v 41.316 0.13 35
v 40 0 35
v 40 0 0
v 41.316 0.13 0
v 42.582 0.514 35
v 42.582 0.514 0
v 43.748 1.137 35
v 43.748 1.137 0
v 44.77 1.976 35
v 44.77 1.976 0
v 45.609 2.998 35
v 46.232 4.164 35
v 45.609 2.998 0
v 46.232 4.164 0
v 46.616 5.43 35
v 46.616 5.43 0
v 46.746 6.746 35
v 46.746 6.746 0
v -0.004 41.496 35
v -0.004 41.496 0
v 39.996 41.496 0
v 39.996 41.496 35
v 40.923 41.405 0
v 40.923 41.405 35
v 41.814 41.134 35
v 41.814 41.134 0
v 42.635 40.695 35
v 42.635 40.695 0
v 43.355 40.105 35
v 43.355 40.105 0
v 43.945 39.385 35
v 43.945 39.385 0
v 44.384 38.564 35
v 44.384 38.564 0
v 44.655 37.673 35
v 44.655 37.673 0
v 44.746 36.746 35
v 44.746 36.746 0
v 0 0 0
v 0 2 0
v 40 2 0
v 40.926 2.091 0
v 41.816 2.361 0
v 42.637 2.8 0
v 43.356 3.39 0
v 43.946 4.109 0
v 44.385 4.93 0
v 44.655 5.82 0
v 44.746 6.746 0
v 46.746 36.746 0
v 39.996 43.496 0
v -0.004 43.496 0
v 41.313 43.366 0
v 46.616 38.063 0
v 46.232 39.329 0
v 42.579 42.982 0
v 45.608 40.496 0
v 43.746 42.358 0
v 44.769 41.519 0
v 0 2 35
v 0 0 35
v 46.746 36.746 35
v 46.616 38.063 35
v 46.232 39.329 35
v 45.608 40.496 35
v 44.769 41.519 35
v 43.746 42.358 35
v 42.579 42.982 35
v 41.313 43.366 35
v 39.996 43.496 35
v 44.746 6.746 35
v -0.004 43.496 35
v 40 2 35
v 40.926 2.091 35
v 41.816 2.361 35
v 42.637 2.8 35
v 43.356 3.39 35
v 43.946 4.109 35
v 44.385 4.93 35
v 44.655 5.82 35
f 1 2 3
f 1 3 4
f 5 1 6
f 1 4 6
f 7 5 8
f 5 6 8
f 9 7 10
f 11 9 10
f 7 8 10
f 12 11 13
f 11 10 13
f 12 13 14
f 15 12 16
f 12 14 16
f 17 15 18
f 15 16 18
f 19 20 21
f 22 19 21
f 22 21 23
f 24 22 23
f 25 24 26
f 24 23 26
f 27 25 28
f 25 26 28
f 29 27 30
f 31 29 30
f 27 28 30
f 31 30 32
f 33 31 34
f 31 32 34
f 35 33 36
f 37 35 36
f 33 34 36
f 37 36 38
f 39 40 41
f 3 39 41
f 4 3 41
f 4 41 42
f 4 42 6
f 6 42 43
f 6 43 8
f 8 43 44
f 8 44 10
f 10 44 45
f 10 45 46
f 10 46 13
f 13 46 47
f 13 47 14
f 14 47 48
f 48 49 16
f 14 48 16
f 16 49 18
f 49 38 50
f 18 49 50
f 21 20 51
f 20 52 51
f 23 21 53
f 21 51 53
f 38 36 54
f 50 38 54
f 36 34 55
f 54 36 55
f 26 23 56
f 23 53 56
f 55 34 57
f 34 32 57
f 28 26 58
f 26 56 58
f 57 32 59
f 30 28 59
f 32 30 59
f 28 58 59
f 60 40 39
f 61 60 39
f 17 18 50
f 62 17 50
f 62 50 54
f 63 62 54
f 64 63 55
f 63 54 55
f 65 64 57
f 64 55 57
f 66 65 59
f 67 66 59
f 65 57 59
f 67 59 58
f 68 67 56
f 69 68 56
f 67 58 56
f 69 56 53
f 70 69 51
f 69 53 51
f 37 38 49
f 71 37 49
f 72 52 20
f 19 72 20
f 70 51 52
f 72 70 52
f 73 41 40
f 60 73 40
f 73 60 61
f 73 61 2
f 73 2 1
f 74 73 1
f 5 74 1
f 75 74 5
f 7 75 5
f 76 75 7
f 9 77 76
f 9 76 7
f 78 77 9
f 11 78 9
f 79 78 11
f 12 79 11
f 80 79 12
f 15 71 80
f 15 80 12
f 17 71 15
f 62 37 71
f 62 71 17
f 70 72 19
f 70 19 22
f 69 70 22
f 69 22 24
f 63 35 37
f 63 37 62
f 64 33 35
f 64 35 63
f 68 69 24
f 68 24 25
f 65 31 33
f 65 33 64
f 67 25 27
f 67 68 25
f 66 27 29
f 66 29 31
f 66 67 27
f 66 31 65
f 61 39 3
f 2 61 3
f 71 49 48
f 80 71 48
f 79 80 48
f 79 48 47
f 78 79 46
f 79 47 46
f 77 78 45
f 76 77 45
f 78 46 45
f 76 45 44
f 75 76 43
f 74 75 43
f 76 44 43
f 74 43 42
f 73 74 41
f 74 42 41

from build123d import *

# Parameters (mm, degrees)
BOSS_EXTRUDE1_DEPTH  = 35
CONVERT_SOLID1_DEPTH = 35


# Read off the part's stored shape, not the designer's step: Convert-Solid1
with BuildPart() as part:
    # Sketch1 → Boss-Extrude1 (new body)
    with BuildSketch(Plane.XY):
        with BuildLine():
            Line((0, 0), (40, 0))
            ThreePointArc((40, 0), (44.770067359, 1.975826594), (46.745893953, 6.745893953))
            Line((46.745893953, 6.745893953), (46.745893953, 36.745893953))
            ThreePointArc((46.745893953, 36.745893953), (44.768864726, 41.518864726), (39.995893953, 43.495893953))
            Line((39.995893953, 43.495893953), (-0.004106047, 43.495893953))
            Line((-0.004106047, 43.495893953), (-0.004106047, 41.995893953))
            Line((-0.004106047, 41.995893953), (39.995893953, 41.995893953))
            ThreePointArc((39.995893953, 41.995893953), (43.708204554, 40.458204554), (45.245893953, 36.745893953))
            Line((45.245893953, 36.745893953), (45.245893953, 6.75))
            ThreePointArc((45.245893953, 6.75), (43.708204554, 3.037689399), (39.995893953, 1.5))
            Line((39.995893953, 1.5), (0, 1.5))
            Line((0, 1.5), (0, 0))
        make_face()
    extrude(amount=BOSS_EXTRUDE1_DEPTH)

    # Convert-Solid1 outline → Convert-Solid1 (add)
    with BuildSketch(Plane.XY):
        with BuildLine():
            Line((39.995893953, 41.995893953), (-0.004106047, 41.995893953))
            Line((-0.004106047, 41.995893953), (-0.004106047, 41.495893953))
            Line((-0.004106047, 41.495893953), (39.995893953, 41.495893953))
            ThreePointArc((39.995893953, 41.495893953), (43.354651163, 40.104651163), (44.745893953, 36.745893953))
            Line((44.745893953, 36.745893953), (44.745893953, 6.745893953))
            ThreePointArc((44.745893953, 6.745893953), (43.355853797, 3.390040156), (40, 2))
            Line((40, 2), (0, 2))
            Line((0, 2), (0, 1.5))
            Line((0, 1.5), (39.995893953, 1.5))
            ThreePointArc((39.995893953, 1.5), (43.708204554, 3.037689399), (45.245893953, 6.75))
            Line((45.245893953, 6.75), (45.245893953, 36.745893953))
            ThreePointArc((45.245893953, 36.745893953), (43.708204554, 40.458204554), (39.995893953, 41.995893953))
        make_face()
    extrude(amount=CONVERT_SOLID1_DEPTH)


solid = part.part
